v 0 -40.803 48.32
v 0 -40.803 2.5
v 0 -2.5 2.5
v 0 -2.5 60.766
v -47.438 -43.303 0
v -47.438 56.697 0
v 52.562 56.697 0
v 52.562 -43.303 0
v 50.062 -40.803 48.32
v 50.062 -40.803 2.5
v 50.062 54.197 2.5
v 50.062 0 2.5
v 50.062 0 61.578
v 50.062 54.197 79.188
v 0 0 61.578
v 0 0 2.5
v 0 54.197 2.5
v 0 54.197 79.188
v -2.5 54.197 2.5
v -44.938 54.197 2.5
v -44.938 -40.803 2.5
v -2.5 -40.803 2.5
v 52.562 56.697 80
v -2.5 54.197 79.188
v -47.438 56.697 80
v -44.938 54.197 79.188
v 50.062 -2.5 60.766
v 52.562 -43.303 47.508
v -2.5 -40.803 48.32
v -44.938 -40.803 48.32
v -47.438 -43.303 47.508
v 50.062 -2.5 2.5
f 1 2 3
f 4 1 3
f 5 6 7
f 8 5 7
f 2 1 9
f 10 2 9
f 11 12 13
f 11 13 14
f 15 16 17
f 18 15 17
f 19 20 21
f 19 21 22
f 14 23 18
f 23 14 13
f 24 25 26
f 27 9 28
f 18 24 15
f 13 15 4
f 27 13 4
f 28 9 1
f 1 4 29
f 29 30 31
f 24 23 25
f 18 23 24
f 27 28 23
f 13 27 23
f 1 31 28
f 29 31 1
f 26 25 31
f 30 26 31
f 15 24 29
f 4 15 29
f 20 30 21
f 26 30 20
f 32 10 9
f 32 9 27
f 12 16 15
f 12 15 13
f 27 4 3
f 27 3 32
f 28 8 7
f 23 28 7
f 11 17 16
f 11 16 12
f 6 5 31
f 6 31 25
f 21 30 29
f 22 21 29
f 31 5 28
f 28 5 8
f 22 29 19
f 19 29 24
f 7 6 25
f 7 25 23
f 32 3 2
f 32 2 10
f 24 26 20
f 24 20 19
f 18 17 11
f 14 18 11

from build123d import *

# Parameters (mm, degrees)
F0_W     = 100
F0_H     = 100
F1_DEPTH = 80
F2_W     = 42.437702
F2_H     = 95
F2_W_2   = 50.062298
F2_H_2   = 54.196703
F2_H_3   = 38.303297
F3_DEPTH = 77.5
F5_DEPTH = 100


with BuildPart() as f1:
    # F0 (on Top) → F1 (new body)
    with BuildSketch(Plane.XY):
        with Locations((2.562298, 6.696703)):
            Rectangle(F0_W, F0_H)
    extrude(amount=F1_DEPTH)

    # F2 (on face) → F3 (cut)
    with BuildSketch(Plane.XY.offset(80)):
        with Locations((-23.718851, 6.696703)):
            Rectangle(F2_W, F2_H)
        with Locations((25.031149, 27.098351)):
            Rectangle(F2_W_2, F2_H_2)
        with Locations((25.031149, -21.651649)):
            Rectangle(F2_W_2, F2_H_3)
    extrude(amount=-F3_DEPTH, mode=Mode.SUBTRACT)

    # F4 (on face) → F5 (cut)
    with BuildSketch(Plane(origin=(-47.437702, 0, 0), x_dir=(0, -1, 0), z_dir=(-1, 0, 0))):
        Polygon((43.303297, 80), (-56.696703, 80), (43.303297, 47.50803), align=None)
    extrude(amount=-F5_DEPTH, mode=Mode.SUBTRACT)


solid = f1.part
